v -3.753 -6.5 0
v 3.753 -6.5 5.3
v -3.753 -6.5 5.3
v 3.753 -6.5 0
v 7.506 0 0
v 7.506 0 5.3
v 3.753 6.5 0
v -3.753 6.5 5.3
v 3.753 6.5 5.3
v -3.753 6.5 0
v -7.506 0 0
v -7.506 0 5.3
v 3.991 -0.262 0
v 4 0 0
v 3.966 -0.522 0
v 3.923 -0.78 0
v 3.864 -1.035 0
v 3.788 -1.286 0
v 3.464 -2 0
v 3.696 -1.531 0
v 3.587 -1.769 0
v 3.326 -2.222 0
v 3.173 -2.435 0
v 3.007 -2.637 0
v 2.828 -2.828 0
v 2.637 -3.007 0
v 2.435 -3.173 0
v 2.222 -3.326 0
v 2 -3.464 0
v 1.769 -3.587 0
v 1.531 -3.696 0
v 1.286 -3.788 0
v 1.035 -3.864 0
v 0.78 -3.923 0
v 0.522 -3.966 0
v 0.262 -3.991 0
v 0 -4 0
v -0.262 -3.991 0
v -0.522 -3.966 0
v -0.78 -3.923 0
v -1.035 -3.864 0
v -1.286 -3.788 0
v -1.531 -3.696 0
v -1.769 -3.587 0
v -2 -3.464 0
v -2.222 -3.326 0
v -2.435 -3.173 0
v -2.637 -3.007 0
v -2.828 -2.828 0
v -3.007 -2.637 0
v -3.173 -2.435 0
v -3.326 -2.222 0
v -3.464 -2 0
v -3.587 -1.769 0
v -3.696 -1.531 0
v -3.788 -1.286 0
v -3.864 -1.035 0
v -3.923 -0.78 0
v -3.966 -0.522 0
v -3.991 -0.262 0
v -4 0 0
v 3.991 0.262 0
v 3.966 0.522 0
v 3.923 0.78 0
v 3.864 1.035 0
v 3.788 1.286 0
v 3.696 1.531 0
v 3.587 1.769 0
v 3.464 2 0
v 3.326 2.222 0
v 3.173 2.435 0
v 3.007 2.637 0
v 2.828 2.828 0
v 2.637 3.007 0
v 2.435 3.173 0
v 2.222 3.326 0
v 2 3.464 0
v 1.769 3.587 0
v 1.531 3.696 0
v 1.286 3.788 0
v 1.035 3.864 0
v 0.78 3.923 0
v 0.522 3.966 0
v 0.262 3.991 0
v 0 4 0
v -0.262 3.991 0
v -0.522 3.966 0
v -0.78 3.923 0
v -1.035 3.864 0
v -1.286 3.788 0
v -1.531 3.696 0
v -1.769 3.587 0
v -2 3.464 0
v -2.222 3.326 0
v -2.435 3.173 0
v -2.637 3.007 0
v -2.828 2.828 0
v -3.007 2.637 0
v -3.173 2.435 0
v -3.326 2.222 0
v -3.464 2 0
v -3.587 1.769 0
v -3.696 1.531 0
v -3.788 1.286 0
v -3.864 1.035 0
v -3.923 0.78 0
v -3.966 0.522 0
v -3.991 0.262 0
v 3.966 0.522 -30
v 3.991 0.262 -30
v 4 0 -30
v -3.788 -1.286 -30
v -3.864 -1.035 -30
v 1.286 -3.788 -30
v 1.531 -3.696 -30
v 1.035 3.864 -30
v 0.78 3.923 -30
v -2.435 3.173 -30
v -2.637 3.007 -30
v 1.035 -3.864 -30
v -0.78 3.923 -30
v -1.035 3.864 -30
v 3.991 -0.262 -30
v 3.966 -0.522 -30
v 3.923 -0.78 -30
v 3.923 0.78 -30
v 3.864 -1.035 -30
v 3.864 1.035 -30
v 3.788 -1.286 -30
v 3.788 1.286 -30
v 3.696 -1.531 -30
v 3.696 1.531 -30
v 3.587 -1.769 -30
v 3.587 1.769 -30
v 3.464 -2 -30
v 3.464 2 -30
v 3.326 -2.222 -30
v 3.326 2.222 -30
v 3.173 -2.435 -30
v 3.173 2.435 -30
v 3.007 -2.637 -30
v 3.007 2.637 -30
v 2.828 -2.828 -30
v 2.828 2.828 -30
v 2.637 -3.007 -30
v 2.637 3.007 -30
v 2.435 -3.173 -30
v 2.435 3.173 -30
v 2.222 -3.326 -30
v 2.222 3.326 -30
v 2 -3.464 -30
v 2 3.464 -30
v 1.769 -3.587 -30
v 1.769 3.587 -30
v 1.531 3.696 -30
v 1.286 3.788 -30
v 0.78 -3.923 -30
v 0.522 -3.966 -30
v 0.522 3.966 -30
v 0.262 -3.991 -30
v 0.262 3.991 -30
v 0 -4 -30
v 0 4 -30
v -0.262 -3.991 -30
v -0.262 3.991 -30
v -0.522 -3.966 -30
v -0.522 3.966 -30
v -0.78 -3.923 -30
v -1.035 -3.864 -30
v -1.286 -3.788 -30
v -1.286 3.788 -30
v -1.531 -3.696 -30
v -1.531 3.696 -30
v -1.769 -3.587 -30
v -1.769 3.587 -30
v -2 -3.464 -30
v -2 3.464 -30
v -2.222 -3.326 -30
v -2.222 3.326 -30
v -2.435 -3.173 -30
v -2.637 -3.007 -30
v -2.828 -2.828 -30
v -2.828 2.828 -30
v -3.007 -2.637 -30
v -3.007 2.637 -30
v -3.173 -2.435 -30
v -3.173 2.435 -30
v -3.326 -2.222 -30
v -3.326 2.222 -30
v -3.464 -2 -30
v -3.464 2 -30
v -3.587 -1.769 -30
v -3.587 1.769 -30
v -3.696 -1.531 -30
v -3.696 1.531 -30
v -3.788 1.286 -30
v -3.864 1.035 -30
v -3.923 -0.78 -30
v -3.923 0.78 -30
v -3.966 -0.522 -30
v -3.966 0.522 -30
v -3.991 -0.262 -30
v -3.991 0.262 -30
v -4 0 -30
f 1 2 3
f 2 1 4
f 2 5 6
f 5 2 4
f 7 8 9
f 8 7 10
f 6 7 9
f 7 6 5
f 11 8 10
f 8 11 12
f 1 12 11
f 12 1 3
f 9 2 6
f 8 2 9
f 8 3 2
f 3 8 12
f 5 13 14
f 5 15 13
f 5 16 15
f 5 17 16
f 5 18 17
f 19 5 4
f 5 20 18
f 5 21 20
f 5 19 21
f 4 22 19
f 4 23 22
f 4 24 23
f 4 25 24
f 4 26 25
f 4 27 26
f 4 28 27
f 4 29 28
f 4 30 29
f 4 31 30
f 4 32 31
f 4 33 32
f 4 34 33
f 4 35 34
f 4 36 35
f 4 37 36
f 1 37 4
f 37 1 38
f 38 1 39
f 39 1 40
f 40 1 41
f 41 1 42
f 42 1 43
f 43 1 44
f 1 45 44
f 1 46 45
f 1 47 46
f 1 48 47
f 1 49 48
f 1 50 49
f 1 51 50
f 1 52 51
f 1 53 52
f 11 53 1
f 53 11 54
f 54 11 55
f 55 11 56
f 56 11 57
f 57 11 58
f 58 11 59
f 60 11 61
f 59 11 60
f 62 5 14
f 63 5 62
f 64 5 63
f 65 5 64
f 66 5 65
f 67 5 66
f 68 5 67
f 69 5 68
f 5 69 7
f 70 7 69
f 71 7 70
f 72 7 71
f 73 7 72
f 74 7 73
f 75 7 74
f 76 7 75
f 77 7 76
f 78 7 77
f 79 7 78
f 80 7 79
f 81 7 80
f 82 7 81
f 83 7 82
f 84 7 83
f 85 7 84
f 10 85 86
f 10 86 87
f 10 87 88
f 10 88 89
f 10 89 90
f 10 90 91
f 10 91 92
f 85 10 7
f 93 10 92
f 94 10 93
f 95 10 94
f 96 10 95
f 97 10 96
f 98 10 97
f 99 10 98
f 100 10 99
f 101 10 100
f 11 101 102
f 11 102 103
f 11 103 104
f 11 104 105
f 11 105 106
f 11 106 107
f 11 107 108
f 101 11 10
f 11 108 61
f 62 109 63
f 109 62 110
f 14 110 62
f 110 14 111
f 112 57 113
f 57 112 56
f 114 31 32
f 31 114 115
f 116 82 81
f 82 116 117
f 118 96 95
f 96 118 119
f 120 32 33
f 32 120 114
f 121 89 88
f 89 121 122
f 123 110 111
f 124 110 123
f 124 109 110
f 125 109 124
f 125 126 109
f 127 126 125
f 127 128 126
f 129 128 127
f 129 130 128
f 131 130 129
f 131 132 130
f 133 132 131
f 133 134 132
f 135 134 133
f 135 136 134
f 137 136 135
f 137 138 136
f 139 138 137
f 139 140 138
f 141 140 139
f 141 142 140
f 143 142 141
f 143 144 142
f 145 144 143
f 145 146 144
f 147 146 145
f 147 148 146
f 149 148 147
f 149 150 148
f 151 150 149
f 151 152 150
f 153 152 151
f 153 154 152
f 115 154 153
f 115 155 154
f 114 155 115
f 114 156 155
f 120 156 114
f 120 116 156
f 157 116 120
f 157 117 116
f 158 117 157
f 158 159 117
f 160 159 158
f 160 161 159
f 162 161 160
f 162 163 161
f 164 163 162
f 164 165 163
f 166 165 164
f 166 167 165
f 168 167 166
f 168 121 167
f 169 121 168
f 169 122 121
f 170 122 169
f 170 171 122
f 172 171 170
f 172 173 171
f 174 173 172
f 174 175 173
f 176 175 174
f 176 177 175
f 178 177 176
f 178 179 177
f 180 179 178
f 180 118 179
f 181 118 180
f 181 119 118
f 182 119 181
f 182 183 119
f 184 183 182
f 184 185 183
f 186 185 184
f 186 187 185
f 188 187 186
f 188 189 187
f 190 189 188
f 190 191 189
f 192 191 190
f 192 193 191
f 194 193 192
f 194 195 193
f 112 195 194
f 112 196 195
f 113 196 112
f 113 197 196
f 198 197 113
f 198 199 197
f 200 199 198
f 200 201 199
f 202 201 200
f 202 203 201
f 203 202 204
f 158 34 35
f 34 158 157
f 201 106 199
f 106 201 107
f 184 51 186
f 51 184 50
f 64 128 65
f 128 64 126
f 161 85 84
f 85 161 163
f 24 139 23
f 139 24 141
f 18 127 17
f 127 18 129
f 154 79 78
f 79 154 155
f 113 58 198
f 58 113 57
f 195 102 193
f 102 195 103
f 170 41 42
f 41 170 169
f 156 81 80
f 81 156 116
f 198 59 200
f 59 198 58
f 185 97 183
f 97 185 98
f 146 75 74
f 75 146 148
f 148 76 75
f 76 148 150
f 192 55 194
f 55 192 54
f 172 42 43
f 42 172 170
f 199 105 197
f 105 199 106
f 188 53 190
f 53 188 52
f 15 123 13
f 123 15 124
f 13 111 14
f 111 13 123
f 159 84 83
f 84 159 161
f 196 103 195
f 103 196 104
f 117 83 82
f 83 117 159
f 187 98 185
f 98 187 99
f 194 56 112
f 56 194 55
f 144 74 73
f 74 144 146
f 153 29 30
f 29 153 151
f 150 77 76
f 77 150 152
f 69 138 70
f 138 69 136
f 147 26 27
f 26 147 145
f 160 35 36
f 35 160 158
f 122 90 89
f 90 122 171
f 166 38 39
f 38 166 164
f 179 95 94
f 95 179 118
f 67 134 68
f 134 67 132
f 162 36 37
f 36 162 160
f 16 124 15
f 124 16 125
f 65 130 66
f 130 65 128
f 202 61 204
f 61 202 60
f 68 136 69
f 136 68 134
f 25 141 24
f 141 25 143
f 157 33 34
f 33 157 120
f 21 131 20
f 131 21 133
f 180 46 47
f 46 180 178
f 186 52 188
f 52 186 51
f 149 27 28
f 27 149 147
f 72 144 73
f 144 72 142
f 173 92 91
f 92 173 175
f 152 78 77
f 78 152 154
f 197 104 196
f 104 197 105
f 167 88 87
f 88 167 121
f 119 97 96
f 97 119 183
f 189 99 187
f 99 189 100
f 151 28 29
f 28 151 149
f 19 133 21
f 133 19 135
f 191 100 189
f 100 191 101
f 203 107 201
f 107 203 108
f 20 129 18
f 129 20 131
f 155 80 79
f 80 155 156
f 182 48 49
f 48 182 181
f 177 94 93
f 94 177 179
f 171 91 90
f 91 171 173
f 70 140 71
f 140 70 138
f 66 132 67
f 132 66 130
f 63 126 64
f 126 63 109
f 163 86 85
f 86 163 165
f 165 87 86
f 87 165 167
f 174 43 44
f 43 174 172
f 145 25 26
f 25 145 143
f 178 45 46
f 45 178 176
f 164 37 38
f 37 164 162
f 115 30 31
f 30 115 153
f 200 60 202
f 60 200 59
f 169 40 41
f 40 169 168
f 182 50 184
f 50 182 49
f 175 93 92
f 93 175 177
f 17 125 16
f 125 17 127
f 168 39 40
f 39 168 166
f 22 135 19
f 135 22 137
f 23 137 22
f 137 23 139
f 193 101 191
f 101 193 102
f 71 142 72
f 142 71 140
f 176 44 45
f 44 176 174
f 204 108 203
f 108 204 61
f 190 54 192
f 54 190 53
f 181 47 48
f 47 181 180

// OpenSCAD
// M8 hex bolt (thread omitted, plain cylindrical shank)

// --- Parameters ---
head_af     = 13;    // across-flats [mm]
head_height = 5.3;   // head height [mm]
shank_dia   = 8;     // shank diameter [mm]
shank_len   = 30;    // shank length [mm]

$fn = 96;

module hex_bolt_m8() {
    // Head: hexagonal prism, bottom face at z = 0, extends to +Z
    cylinder(h = head_height, r = head_af / (2 * cos(30)), $fn = 6);

    // Shank: extends from z = 0 to z = -shank_len
    translate([0, 0, -shank_len])
        cylinder(h = shank_len, d = shank_dia);
}

hex_bolt_m8();
